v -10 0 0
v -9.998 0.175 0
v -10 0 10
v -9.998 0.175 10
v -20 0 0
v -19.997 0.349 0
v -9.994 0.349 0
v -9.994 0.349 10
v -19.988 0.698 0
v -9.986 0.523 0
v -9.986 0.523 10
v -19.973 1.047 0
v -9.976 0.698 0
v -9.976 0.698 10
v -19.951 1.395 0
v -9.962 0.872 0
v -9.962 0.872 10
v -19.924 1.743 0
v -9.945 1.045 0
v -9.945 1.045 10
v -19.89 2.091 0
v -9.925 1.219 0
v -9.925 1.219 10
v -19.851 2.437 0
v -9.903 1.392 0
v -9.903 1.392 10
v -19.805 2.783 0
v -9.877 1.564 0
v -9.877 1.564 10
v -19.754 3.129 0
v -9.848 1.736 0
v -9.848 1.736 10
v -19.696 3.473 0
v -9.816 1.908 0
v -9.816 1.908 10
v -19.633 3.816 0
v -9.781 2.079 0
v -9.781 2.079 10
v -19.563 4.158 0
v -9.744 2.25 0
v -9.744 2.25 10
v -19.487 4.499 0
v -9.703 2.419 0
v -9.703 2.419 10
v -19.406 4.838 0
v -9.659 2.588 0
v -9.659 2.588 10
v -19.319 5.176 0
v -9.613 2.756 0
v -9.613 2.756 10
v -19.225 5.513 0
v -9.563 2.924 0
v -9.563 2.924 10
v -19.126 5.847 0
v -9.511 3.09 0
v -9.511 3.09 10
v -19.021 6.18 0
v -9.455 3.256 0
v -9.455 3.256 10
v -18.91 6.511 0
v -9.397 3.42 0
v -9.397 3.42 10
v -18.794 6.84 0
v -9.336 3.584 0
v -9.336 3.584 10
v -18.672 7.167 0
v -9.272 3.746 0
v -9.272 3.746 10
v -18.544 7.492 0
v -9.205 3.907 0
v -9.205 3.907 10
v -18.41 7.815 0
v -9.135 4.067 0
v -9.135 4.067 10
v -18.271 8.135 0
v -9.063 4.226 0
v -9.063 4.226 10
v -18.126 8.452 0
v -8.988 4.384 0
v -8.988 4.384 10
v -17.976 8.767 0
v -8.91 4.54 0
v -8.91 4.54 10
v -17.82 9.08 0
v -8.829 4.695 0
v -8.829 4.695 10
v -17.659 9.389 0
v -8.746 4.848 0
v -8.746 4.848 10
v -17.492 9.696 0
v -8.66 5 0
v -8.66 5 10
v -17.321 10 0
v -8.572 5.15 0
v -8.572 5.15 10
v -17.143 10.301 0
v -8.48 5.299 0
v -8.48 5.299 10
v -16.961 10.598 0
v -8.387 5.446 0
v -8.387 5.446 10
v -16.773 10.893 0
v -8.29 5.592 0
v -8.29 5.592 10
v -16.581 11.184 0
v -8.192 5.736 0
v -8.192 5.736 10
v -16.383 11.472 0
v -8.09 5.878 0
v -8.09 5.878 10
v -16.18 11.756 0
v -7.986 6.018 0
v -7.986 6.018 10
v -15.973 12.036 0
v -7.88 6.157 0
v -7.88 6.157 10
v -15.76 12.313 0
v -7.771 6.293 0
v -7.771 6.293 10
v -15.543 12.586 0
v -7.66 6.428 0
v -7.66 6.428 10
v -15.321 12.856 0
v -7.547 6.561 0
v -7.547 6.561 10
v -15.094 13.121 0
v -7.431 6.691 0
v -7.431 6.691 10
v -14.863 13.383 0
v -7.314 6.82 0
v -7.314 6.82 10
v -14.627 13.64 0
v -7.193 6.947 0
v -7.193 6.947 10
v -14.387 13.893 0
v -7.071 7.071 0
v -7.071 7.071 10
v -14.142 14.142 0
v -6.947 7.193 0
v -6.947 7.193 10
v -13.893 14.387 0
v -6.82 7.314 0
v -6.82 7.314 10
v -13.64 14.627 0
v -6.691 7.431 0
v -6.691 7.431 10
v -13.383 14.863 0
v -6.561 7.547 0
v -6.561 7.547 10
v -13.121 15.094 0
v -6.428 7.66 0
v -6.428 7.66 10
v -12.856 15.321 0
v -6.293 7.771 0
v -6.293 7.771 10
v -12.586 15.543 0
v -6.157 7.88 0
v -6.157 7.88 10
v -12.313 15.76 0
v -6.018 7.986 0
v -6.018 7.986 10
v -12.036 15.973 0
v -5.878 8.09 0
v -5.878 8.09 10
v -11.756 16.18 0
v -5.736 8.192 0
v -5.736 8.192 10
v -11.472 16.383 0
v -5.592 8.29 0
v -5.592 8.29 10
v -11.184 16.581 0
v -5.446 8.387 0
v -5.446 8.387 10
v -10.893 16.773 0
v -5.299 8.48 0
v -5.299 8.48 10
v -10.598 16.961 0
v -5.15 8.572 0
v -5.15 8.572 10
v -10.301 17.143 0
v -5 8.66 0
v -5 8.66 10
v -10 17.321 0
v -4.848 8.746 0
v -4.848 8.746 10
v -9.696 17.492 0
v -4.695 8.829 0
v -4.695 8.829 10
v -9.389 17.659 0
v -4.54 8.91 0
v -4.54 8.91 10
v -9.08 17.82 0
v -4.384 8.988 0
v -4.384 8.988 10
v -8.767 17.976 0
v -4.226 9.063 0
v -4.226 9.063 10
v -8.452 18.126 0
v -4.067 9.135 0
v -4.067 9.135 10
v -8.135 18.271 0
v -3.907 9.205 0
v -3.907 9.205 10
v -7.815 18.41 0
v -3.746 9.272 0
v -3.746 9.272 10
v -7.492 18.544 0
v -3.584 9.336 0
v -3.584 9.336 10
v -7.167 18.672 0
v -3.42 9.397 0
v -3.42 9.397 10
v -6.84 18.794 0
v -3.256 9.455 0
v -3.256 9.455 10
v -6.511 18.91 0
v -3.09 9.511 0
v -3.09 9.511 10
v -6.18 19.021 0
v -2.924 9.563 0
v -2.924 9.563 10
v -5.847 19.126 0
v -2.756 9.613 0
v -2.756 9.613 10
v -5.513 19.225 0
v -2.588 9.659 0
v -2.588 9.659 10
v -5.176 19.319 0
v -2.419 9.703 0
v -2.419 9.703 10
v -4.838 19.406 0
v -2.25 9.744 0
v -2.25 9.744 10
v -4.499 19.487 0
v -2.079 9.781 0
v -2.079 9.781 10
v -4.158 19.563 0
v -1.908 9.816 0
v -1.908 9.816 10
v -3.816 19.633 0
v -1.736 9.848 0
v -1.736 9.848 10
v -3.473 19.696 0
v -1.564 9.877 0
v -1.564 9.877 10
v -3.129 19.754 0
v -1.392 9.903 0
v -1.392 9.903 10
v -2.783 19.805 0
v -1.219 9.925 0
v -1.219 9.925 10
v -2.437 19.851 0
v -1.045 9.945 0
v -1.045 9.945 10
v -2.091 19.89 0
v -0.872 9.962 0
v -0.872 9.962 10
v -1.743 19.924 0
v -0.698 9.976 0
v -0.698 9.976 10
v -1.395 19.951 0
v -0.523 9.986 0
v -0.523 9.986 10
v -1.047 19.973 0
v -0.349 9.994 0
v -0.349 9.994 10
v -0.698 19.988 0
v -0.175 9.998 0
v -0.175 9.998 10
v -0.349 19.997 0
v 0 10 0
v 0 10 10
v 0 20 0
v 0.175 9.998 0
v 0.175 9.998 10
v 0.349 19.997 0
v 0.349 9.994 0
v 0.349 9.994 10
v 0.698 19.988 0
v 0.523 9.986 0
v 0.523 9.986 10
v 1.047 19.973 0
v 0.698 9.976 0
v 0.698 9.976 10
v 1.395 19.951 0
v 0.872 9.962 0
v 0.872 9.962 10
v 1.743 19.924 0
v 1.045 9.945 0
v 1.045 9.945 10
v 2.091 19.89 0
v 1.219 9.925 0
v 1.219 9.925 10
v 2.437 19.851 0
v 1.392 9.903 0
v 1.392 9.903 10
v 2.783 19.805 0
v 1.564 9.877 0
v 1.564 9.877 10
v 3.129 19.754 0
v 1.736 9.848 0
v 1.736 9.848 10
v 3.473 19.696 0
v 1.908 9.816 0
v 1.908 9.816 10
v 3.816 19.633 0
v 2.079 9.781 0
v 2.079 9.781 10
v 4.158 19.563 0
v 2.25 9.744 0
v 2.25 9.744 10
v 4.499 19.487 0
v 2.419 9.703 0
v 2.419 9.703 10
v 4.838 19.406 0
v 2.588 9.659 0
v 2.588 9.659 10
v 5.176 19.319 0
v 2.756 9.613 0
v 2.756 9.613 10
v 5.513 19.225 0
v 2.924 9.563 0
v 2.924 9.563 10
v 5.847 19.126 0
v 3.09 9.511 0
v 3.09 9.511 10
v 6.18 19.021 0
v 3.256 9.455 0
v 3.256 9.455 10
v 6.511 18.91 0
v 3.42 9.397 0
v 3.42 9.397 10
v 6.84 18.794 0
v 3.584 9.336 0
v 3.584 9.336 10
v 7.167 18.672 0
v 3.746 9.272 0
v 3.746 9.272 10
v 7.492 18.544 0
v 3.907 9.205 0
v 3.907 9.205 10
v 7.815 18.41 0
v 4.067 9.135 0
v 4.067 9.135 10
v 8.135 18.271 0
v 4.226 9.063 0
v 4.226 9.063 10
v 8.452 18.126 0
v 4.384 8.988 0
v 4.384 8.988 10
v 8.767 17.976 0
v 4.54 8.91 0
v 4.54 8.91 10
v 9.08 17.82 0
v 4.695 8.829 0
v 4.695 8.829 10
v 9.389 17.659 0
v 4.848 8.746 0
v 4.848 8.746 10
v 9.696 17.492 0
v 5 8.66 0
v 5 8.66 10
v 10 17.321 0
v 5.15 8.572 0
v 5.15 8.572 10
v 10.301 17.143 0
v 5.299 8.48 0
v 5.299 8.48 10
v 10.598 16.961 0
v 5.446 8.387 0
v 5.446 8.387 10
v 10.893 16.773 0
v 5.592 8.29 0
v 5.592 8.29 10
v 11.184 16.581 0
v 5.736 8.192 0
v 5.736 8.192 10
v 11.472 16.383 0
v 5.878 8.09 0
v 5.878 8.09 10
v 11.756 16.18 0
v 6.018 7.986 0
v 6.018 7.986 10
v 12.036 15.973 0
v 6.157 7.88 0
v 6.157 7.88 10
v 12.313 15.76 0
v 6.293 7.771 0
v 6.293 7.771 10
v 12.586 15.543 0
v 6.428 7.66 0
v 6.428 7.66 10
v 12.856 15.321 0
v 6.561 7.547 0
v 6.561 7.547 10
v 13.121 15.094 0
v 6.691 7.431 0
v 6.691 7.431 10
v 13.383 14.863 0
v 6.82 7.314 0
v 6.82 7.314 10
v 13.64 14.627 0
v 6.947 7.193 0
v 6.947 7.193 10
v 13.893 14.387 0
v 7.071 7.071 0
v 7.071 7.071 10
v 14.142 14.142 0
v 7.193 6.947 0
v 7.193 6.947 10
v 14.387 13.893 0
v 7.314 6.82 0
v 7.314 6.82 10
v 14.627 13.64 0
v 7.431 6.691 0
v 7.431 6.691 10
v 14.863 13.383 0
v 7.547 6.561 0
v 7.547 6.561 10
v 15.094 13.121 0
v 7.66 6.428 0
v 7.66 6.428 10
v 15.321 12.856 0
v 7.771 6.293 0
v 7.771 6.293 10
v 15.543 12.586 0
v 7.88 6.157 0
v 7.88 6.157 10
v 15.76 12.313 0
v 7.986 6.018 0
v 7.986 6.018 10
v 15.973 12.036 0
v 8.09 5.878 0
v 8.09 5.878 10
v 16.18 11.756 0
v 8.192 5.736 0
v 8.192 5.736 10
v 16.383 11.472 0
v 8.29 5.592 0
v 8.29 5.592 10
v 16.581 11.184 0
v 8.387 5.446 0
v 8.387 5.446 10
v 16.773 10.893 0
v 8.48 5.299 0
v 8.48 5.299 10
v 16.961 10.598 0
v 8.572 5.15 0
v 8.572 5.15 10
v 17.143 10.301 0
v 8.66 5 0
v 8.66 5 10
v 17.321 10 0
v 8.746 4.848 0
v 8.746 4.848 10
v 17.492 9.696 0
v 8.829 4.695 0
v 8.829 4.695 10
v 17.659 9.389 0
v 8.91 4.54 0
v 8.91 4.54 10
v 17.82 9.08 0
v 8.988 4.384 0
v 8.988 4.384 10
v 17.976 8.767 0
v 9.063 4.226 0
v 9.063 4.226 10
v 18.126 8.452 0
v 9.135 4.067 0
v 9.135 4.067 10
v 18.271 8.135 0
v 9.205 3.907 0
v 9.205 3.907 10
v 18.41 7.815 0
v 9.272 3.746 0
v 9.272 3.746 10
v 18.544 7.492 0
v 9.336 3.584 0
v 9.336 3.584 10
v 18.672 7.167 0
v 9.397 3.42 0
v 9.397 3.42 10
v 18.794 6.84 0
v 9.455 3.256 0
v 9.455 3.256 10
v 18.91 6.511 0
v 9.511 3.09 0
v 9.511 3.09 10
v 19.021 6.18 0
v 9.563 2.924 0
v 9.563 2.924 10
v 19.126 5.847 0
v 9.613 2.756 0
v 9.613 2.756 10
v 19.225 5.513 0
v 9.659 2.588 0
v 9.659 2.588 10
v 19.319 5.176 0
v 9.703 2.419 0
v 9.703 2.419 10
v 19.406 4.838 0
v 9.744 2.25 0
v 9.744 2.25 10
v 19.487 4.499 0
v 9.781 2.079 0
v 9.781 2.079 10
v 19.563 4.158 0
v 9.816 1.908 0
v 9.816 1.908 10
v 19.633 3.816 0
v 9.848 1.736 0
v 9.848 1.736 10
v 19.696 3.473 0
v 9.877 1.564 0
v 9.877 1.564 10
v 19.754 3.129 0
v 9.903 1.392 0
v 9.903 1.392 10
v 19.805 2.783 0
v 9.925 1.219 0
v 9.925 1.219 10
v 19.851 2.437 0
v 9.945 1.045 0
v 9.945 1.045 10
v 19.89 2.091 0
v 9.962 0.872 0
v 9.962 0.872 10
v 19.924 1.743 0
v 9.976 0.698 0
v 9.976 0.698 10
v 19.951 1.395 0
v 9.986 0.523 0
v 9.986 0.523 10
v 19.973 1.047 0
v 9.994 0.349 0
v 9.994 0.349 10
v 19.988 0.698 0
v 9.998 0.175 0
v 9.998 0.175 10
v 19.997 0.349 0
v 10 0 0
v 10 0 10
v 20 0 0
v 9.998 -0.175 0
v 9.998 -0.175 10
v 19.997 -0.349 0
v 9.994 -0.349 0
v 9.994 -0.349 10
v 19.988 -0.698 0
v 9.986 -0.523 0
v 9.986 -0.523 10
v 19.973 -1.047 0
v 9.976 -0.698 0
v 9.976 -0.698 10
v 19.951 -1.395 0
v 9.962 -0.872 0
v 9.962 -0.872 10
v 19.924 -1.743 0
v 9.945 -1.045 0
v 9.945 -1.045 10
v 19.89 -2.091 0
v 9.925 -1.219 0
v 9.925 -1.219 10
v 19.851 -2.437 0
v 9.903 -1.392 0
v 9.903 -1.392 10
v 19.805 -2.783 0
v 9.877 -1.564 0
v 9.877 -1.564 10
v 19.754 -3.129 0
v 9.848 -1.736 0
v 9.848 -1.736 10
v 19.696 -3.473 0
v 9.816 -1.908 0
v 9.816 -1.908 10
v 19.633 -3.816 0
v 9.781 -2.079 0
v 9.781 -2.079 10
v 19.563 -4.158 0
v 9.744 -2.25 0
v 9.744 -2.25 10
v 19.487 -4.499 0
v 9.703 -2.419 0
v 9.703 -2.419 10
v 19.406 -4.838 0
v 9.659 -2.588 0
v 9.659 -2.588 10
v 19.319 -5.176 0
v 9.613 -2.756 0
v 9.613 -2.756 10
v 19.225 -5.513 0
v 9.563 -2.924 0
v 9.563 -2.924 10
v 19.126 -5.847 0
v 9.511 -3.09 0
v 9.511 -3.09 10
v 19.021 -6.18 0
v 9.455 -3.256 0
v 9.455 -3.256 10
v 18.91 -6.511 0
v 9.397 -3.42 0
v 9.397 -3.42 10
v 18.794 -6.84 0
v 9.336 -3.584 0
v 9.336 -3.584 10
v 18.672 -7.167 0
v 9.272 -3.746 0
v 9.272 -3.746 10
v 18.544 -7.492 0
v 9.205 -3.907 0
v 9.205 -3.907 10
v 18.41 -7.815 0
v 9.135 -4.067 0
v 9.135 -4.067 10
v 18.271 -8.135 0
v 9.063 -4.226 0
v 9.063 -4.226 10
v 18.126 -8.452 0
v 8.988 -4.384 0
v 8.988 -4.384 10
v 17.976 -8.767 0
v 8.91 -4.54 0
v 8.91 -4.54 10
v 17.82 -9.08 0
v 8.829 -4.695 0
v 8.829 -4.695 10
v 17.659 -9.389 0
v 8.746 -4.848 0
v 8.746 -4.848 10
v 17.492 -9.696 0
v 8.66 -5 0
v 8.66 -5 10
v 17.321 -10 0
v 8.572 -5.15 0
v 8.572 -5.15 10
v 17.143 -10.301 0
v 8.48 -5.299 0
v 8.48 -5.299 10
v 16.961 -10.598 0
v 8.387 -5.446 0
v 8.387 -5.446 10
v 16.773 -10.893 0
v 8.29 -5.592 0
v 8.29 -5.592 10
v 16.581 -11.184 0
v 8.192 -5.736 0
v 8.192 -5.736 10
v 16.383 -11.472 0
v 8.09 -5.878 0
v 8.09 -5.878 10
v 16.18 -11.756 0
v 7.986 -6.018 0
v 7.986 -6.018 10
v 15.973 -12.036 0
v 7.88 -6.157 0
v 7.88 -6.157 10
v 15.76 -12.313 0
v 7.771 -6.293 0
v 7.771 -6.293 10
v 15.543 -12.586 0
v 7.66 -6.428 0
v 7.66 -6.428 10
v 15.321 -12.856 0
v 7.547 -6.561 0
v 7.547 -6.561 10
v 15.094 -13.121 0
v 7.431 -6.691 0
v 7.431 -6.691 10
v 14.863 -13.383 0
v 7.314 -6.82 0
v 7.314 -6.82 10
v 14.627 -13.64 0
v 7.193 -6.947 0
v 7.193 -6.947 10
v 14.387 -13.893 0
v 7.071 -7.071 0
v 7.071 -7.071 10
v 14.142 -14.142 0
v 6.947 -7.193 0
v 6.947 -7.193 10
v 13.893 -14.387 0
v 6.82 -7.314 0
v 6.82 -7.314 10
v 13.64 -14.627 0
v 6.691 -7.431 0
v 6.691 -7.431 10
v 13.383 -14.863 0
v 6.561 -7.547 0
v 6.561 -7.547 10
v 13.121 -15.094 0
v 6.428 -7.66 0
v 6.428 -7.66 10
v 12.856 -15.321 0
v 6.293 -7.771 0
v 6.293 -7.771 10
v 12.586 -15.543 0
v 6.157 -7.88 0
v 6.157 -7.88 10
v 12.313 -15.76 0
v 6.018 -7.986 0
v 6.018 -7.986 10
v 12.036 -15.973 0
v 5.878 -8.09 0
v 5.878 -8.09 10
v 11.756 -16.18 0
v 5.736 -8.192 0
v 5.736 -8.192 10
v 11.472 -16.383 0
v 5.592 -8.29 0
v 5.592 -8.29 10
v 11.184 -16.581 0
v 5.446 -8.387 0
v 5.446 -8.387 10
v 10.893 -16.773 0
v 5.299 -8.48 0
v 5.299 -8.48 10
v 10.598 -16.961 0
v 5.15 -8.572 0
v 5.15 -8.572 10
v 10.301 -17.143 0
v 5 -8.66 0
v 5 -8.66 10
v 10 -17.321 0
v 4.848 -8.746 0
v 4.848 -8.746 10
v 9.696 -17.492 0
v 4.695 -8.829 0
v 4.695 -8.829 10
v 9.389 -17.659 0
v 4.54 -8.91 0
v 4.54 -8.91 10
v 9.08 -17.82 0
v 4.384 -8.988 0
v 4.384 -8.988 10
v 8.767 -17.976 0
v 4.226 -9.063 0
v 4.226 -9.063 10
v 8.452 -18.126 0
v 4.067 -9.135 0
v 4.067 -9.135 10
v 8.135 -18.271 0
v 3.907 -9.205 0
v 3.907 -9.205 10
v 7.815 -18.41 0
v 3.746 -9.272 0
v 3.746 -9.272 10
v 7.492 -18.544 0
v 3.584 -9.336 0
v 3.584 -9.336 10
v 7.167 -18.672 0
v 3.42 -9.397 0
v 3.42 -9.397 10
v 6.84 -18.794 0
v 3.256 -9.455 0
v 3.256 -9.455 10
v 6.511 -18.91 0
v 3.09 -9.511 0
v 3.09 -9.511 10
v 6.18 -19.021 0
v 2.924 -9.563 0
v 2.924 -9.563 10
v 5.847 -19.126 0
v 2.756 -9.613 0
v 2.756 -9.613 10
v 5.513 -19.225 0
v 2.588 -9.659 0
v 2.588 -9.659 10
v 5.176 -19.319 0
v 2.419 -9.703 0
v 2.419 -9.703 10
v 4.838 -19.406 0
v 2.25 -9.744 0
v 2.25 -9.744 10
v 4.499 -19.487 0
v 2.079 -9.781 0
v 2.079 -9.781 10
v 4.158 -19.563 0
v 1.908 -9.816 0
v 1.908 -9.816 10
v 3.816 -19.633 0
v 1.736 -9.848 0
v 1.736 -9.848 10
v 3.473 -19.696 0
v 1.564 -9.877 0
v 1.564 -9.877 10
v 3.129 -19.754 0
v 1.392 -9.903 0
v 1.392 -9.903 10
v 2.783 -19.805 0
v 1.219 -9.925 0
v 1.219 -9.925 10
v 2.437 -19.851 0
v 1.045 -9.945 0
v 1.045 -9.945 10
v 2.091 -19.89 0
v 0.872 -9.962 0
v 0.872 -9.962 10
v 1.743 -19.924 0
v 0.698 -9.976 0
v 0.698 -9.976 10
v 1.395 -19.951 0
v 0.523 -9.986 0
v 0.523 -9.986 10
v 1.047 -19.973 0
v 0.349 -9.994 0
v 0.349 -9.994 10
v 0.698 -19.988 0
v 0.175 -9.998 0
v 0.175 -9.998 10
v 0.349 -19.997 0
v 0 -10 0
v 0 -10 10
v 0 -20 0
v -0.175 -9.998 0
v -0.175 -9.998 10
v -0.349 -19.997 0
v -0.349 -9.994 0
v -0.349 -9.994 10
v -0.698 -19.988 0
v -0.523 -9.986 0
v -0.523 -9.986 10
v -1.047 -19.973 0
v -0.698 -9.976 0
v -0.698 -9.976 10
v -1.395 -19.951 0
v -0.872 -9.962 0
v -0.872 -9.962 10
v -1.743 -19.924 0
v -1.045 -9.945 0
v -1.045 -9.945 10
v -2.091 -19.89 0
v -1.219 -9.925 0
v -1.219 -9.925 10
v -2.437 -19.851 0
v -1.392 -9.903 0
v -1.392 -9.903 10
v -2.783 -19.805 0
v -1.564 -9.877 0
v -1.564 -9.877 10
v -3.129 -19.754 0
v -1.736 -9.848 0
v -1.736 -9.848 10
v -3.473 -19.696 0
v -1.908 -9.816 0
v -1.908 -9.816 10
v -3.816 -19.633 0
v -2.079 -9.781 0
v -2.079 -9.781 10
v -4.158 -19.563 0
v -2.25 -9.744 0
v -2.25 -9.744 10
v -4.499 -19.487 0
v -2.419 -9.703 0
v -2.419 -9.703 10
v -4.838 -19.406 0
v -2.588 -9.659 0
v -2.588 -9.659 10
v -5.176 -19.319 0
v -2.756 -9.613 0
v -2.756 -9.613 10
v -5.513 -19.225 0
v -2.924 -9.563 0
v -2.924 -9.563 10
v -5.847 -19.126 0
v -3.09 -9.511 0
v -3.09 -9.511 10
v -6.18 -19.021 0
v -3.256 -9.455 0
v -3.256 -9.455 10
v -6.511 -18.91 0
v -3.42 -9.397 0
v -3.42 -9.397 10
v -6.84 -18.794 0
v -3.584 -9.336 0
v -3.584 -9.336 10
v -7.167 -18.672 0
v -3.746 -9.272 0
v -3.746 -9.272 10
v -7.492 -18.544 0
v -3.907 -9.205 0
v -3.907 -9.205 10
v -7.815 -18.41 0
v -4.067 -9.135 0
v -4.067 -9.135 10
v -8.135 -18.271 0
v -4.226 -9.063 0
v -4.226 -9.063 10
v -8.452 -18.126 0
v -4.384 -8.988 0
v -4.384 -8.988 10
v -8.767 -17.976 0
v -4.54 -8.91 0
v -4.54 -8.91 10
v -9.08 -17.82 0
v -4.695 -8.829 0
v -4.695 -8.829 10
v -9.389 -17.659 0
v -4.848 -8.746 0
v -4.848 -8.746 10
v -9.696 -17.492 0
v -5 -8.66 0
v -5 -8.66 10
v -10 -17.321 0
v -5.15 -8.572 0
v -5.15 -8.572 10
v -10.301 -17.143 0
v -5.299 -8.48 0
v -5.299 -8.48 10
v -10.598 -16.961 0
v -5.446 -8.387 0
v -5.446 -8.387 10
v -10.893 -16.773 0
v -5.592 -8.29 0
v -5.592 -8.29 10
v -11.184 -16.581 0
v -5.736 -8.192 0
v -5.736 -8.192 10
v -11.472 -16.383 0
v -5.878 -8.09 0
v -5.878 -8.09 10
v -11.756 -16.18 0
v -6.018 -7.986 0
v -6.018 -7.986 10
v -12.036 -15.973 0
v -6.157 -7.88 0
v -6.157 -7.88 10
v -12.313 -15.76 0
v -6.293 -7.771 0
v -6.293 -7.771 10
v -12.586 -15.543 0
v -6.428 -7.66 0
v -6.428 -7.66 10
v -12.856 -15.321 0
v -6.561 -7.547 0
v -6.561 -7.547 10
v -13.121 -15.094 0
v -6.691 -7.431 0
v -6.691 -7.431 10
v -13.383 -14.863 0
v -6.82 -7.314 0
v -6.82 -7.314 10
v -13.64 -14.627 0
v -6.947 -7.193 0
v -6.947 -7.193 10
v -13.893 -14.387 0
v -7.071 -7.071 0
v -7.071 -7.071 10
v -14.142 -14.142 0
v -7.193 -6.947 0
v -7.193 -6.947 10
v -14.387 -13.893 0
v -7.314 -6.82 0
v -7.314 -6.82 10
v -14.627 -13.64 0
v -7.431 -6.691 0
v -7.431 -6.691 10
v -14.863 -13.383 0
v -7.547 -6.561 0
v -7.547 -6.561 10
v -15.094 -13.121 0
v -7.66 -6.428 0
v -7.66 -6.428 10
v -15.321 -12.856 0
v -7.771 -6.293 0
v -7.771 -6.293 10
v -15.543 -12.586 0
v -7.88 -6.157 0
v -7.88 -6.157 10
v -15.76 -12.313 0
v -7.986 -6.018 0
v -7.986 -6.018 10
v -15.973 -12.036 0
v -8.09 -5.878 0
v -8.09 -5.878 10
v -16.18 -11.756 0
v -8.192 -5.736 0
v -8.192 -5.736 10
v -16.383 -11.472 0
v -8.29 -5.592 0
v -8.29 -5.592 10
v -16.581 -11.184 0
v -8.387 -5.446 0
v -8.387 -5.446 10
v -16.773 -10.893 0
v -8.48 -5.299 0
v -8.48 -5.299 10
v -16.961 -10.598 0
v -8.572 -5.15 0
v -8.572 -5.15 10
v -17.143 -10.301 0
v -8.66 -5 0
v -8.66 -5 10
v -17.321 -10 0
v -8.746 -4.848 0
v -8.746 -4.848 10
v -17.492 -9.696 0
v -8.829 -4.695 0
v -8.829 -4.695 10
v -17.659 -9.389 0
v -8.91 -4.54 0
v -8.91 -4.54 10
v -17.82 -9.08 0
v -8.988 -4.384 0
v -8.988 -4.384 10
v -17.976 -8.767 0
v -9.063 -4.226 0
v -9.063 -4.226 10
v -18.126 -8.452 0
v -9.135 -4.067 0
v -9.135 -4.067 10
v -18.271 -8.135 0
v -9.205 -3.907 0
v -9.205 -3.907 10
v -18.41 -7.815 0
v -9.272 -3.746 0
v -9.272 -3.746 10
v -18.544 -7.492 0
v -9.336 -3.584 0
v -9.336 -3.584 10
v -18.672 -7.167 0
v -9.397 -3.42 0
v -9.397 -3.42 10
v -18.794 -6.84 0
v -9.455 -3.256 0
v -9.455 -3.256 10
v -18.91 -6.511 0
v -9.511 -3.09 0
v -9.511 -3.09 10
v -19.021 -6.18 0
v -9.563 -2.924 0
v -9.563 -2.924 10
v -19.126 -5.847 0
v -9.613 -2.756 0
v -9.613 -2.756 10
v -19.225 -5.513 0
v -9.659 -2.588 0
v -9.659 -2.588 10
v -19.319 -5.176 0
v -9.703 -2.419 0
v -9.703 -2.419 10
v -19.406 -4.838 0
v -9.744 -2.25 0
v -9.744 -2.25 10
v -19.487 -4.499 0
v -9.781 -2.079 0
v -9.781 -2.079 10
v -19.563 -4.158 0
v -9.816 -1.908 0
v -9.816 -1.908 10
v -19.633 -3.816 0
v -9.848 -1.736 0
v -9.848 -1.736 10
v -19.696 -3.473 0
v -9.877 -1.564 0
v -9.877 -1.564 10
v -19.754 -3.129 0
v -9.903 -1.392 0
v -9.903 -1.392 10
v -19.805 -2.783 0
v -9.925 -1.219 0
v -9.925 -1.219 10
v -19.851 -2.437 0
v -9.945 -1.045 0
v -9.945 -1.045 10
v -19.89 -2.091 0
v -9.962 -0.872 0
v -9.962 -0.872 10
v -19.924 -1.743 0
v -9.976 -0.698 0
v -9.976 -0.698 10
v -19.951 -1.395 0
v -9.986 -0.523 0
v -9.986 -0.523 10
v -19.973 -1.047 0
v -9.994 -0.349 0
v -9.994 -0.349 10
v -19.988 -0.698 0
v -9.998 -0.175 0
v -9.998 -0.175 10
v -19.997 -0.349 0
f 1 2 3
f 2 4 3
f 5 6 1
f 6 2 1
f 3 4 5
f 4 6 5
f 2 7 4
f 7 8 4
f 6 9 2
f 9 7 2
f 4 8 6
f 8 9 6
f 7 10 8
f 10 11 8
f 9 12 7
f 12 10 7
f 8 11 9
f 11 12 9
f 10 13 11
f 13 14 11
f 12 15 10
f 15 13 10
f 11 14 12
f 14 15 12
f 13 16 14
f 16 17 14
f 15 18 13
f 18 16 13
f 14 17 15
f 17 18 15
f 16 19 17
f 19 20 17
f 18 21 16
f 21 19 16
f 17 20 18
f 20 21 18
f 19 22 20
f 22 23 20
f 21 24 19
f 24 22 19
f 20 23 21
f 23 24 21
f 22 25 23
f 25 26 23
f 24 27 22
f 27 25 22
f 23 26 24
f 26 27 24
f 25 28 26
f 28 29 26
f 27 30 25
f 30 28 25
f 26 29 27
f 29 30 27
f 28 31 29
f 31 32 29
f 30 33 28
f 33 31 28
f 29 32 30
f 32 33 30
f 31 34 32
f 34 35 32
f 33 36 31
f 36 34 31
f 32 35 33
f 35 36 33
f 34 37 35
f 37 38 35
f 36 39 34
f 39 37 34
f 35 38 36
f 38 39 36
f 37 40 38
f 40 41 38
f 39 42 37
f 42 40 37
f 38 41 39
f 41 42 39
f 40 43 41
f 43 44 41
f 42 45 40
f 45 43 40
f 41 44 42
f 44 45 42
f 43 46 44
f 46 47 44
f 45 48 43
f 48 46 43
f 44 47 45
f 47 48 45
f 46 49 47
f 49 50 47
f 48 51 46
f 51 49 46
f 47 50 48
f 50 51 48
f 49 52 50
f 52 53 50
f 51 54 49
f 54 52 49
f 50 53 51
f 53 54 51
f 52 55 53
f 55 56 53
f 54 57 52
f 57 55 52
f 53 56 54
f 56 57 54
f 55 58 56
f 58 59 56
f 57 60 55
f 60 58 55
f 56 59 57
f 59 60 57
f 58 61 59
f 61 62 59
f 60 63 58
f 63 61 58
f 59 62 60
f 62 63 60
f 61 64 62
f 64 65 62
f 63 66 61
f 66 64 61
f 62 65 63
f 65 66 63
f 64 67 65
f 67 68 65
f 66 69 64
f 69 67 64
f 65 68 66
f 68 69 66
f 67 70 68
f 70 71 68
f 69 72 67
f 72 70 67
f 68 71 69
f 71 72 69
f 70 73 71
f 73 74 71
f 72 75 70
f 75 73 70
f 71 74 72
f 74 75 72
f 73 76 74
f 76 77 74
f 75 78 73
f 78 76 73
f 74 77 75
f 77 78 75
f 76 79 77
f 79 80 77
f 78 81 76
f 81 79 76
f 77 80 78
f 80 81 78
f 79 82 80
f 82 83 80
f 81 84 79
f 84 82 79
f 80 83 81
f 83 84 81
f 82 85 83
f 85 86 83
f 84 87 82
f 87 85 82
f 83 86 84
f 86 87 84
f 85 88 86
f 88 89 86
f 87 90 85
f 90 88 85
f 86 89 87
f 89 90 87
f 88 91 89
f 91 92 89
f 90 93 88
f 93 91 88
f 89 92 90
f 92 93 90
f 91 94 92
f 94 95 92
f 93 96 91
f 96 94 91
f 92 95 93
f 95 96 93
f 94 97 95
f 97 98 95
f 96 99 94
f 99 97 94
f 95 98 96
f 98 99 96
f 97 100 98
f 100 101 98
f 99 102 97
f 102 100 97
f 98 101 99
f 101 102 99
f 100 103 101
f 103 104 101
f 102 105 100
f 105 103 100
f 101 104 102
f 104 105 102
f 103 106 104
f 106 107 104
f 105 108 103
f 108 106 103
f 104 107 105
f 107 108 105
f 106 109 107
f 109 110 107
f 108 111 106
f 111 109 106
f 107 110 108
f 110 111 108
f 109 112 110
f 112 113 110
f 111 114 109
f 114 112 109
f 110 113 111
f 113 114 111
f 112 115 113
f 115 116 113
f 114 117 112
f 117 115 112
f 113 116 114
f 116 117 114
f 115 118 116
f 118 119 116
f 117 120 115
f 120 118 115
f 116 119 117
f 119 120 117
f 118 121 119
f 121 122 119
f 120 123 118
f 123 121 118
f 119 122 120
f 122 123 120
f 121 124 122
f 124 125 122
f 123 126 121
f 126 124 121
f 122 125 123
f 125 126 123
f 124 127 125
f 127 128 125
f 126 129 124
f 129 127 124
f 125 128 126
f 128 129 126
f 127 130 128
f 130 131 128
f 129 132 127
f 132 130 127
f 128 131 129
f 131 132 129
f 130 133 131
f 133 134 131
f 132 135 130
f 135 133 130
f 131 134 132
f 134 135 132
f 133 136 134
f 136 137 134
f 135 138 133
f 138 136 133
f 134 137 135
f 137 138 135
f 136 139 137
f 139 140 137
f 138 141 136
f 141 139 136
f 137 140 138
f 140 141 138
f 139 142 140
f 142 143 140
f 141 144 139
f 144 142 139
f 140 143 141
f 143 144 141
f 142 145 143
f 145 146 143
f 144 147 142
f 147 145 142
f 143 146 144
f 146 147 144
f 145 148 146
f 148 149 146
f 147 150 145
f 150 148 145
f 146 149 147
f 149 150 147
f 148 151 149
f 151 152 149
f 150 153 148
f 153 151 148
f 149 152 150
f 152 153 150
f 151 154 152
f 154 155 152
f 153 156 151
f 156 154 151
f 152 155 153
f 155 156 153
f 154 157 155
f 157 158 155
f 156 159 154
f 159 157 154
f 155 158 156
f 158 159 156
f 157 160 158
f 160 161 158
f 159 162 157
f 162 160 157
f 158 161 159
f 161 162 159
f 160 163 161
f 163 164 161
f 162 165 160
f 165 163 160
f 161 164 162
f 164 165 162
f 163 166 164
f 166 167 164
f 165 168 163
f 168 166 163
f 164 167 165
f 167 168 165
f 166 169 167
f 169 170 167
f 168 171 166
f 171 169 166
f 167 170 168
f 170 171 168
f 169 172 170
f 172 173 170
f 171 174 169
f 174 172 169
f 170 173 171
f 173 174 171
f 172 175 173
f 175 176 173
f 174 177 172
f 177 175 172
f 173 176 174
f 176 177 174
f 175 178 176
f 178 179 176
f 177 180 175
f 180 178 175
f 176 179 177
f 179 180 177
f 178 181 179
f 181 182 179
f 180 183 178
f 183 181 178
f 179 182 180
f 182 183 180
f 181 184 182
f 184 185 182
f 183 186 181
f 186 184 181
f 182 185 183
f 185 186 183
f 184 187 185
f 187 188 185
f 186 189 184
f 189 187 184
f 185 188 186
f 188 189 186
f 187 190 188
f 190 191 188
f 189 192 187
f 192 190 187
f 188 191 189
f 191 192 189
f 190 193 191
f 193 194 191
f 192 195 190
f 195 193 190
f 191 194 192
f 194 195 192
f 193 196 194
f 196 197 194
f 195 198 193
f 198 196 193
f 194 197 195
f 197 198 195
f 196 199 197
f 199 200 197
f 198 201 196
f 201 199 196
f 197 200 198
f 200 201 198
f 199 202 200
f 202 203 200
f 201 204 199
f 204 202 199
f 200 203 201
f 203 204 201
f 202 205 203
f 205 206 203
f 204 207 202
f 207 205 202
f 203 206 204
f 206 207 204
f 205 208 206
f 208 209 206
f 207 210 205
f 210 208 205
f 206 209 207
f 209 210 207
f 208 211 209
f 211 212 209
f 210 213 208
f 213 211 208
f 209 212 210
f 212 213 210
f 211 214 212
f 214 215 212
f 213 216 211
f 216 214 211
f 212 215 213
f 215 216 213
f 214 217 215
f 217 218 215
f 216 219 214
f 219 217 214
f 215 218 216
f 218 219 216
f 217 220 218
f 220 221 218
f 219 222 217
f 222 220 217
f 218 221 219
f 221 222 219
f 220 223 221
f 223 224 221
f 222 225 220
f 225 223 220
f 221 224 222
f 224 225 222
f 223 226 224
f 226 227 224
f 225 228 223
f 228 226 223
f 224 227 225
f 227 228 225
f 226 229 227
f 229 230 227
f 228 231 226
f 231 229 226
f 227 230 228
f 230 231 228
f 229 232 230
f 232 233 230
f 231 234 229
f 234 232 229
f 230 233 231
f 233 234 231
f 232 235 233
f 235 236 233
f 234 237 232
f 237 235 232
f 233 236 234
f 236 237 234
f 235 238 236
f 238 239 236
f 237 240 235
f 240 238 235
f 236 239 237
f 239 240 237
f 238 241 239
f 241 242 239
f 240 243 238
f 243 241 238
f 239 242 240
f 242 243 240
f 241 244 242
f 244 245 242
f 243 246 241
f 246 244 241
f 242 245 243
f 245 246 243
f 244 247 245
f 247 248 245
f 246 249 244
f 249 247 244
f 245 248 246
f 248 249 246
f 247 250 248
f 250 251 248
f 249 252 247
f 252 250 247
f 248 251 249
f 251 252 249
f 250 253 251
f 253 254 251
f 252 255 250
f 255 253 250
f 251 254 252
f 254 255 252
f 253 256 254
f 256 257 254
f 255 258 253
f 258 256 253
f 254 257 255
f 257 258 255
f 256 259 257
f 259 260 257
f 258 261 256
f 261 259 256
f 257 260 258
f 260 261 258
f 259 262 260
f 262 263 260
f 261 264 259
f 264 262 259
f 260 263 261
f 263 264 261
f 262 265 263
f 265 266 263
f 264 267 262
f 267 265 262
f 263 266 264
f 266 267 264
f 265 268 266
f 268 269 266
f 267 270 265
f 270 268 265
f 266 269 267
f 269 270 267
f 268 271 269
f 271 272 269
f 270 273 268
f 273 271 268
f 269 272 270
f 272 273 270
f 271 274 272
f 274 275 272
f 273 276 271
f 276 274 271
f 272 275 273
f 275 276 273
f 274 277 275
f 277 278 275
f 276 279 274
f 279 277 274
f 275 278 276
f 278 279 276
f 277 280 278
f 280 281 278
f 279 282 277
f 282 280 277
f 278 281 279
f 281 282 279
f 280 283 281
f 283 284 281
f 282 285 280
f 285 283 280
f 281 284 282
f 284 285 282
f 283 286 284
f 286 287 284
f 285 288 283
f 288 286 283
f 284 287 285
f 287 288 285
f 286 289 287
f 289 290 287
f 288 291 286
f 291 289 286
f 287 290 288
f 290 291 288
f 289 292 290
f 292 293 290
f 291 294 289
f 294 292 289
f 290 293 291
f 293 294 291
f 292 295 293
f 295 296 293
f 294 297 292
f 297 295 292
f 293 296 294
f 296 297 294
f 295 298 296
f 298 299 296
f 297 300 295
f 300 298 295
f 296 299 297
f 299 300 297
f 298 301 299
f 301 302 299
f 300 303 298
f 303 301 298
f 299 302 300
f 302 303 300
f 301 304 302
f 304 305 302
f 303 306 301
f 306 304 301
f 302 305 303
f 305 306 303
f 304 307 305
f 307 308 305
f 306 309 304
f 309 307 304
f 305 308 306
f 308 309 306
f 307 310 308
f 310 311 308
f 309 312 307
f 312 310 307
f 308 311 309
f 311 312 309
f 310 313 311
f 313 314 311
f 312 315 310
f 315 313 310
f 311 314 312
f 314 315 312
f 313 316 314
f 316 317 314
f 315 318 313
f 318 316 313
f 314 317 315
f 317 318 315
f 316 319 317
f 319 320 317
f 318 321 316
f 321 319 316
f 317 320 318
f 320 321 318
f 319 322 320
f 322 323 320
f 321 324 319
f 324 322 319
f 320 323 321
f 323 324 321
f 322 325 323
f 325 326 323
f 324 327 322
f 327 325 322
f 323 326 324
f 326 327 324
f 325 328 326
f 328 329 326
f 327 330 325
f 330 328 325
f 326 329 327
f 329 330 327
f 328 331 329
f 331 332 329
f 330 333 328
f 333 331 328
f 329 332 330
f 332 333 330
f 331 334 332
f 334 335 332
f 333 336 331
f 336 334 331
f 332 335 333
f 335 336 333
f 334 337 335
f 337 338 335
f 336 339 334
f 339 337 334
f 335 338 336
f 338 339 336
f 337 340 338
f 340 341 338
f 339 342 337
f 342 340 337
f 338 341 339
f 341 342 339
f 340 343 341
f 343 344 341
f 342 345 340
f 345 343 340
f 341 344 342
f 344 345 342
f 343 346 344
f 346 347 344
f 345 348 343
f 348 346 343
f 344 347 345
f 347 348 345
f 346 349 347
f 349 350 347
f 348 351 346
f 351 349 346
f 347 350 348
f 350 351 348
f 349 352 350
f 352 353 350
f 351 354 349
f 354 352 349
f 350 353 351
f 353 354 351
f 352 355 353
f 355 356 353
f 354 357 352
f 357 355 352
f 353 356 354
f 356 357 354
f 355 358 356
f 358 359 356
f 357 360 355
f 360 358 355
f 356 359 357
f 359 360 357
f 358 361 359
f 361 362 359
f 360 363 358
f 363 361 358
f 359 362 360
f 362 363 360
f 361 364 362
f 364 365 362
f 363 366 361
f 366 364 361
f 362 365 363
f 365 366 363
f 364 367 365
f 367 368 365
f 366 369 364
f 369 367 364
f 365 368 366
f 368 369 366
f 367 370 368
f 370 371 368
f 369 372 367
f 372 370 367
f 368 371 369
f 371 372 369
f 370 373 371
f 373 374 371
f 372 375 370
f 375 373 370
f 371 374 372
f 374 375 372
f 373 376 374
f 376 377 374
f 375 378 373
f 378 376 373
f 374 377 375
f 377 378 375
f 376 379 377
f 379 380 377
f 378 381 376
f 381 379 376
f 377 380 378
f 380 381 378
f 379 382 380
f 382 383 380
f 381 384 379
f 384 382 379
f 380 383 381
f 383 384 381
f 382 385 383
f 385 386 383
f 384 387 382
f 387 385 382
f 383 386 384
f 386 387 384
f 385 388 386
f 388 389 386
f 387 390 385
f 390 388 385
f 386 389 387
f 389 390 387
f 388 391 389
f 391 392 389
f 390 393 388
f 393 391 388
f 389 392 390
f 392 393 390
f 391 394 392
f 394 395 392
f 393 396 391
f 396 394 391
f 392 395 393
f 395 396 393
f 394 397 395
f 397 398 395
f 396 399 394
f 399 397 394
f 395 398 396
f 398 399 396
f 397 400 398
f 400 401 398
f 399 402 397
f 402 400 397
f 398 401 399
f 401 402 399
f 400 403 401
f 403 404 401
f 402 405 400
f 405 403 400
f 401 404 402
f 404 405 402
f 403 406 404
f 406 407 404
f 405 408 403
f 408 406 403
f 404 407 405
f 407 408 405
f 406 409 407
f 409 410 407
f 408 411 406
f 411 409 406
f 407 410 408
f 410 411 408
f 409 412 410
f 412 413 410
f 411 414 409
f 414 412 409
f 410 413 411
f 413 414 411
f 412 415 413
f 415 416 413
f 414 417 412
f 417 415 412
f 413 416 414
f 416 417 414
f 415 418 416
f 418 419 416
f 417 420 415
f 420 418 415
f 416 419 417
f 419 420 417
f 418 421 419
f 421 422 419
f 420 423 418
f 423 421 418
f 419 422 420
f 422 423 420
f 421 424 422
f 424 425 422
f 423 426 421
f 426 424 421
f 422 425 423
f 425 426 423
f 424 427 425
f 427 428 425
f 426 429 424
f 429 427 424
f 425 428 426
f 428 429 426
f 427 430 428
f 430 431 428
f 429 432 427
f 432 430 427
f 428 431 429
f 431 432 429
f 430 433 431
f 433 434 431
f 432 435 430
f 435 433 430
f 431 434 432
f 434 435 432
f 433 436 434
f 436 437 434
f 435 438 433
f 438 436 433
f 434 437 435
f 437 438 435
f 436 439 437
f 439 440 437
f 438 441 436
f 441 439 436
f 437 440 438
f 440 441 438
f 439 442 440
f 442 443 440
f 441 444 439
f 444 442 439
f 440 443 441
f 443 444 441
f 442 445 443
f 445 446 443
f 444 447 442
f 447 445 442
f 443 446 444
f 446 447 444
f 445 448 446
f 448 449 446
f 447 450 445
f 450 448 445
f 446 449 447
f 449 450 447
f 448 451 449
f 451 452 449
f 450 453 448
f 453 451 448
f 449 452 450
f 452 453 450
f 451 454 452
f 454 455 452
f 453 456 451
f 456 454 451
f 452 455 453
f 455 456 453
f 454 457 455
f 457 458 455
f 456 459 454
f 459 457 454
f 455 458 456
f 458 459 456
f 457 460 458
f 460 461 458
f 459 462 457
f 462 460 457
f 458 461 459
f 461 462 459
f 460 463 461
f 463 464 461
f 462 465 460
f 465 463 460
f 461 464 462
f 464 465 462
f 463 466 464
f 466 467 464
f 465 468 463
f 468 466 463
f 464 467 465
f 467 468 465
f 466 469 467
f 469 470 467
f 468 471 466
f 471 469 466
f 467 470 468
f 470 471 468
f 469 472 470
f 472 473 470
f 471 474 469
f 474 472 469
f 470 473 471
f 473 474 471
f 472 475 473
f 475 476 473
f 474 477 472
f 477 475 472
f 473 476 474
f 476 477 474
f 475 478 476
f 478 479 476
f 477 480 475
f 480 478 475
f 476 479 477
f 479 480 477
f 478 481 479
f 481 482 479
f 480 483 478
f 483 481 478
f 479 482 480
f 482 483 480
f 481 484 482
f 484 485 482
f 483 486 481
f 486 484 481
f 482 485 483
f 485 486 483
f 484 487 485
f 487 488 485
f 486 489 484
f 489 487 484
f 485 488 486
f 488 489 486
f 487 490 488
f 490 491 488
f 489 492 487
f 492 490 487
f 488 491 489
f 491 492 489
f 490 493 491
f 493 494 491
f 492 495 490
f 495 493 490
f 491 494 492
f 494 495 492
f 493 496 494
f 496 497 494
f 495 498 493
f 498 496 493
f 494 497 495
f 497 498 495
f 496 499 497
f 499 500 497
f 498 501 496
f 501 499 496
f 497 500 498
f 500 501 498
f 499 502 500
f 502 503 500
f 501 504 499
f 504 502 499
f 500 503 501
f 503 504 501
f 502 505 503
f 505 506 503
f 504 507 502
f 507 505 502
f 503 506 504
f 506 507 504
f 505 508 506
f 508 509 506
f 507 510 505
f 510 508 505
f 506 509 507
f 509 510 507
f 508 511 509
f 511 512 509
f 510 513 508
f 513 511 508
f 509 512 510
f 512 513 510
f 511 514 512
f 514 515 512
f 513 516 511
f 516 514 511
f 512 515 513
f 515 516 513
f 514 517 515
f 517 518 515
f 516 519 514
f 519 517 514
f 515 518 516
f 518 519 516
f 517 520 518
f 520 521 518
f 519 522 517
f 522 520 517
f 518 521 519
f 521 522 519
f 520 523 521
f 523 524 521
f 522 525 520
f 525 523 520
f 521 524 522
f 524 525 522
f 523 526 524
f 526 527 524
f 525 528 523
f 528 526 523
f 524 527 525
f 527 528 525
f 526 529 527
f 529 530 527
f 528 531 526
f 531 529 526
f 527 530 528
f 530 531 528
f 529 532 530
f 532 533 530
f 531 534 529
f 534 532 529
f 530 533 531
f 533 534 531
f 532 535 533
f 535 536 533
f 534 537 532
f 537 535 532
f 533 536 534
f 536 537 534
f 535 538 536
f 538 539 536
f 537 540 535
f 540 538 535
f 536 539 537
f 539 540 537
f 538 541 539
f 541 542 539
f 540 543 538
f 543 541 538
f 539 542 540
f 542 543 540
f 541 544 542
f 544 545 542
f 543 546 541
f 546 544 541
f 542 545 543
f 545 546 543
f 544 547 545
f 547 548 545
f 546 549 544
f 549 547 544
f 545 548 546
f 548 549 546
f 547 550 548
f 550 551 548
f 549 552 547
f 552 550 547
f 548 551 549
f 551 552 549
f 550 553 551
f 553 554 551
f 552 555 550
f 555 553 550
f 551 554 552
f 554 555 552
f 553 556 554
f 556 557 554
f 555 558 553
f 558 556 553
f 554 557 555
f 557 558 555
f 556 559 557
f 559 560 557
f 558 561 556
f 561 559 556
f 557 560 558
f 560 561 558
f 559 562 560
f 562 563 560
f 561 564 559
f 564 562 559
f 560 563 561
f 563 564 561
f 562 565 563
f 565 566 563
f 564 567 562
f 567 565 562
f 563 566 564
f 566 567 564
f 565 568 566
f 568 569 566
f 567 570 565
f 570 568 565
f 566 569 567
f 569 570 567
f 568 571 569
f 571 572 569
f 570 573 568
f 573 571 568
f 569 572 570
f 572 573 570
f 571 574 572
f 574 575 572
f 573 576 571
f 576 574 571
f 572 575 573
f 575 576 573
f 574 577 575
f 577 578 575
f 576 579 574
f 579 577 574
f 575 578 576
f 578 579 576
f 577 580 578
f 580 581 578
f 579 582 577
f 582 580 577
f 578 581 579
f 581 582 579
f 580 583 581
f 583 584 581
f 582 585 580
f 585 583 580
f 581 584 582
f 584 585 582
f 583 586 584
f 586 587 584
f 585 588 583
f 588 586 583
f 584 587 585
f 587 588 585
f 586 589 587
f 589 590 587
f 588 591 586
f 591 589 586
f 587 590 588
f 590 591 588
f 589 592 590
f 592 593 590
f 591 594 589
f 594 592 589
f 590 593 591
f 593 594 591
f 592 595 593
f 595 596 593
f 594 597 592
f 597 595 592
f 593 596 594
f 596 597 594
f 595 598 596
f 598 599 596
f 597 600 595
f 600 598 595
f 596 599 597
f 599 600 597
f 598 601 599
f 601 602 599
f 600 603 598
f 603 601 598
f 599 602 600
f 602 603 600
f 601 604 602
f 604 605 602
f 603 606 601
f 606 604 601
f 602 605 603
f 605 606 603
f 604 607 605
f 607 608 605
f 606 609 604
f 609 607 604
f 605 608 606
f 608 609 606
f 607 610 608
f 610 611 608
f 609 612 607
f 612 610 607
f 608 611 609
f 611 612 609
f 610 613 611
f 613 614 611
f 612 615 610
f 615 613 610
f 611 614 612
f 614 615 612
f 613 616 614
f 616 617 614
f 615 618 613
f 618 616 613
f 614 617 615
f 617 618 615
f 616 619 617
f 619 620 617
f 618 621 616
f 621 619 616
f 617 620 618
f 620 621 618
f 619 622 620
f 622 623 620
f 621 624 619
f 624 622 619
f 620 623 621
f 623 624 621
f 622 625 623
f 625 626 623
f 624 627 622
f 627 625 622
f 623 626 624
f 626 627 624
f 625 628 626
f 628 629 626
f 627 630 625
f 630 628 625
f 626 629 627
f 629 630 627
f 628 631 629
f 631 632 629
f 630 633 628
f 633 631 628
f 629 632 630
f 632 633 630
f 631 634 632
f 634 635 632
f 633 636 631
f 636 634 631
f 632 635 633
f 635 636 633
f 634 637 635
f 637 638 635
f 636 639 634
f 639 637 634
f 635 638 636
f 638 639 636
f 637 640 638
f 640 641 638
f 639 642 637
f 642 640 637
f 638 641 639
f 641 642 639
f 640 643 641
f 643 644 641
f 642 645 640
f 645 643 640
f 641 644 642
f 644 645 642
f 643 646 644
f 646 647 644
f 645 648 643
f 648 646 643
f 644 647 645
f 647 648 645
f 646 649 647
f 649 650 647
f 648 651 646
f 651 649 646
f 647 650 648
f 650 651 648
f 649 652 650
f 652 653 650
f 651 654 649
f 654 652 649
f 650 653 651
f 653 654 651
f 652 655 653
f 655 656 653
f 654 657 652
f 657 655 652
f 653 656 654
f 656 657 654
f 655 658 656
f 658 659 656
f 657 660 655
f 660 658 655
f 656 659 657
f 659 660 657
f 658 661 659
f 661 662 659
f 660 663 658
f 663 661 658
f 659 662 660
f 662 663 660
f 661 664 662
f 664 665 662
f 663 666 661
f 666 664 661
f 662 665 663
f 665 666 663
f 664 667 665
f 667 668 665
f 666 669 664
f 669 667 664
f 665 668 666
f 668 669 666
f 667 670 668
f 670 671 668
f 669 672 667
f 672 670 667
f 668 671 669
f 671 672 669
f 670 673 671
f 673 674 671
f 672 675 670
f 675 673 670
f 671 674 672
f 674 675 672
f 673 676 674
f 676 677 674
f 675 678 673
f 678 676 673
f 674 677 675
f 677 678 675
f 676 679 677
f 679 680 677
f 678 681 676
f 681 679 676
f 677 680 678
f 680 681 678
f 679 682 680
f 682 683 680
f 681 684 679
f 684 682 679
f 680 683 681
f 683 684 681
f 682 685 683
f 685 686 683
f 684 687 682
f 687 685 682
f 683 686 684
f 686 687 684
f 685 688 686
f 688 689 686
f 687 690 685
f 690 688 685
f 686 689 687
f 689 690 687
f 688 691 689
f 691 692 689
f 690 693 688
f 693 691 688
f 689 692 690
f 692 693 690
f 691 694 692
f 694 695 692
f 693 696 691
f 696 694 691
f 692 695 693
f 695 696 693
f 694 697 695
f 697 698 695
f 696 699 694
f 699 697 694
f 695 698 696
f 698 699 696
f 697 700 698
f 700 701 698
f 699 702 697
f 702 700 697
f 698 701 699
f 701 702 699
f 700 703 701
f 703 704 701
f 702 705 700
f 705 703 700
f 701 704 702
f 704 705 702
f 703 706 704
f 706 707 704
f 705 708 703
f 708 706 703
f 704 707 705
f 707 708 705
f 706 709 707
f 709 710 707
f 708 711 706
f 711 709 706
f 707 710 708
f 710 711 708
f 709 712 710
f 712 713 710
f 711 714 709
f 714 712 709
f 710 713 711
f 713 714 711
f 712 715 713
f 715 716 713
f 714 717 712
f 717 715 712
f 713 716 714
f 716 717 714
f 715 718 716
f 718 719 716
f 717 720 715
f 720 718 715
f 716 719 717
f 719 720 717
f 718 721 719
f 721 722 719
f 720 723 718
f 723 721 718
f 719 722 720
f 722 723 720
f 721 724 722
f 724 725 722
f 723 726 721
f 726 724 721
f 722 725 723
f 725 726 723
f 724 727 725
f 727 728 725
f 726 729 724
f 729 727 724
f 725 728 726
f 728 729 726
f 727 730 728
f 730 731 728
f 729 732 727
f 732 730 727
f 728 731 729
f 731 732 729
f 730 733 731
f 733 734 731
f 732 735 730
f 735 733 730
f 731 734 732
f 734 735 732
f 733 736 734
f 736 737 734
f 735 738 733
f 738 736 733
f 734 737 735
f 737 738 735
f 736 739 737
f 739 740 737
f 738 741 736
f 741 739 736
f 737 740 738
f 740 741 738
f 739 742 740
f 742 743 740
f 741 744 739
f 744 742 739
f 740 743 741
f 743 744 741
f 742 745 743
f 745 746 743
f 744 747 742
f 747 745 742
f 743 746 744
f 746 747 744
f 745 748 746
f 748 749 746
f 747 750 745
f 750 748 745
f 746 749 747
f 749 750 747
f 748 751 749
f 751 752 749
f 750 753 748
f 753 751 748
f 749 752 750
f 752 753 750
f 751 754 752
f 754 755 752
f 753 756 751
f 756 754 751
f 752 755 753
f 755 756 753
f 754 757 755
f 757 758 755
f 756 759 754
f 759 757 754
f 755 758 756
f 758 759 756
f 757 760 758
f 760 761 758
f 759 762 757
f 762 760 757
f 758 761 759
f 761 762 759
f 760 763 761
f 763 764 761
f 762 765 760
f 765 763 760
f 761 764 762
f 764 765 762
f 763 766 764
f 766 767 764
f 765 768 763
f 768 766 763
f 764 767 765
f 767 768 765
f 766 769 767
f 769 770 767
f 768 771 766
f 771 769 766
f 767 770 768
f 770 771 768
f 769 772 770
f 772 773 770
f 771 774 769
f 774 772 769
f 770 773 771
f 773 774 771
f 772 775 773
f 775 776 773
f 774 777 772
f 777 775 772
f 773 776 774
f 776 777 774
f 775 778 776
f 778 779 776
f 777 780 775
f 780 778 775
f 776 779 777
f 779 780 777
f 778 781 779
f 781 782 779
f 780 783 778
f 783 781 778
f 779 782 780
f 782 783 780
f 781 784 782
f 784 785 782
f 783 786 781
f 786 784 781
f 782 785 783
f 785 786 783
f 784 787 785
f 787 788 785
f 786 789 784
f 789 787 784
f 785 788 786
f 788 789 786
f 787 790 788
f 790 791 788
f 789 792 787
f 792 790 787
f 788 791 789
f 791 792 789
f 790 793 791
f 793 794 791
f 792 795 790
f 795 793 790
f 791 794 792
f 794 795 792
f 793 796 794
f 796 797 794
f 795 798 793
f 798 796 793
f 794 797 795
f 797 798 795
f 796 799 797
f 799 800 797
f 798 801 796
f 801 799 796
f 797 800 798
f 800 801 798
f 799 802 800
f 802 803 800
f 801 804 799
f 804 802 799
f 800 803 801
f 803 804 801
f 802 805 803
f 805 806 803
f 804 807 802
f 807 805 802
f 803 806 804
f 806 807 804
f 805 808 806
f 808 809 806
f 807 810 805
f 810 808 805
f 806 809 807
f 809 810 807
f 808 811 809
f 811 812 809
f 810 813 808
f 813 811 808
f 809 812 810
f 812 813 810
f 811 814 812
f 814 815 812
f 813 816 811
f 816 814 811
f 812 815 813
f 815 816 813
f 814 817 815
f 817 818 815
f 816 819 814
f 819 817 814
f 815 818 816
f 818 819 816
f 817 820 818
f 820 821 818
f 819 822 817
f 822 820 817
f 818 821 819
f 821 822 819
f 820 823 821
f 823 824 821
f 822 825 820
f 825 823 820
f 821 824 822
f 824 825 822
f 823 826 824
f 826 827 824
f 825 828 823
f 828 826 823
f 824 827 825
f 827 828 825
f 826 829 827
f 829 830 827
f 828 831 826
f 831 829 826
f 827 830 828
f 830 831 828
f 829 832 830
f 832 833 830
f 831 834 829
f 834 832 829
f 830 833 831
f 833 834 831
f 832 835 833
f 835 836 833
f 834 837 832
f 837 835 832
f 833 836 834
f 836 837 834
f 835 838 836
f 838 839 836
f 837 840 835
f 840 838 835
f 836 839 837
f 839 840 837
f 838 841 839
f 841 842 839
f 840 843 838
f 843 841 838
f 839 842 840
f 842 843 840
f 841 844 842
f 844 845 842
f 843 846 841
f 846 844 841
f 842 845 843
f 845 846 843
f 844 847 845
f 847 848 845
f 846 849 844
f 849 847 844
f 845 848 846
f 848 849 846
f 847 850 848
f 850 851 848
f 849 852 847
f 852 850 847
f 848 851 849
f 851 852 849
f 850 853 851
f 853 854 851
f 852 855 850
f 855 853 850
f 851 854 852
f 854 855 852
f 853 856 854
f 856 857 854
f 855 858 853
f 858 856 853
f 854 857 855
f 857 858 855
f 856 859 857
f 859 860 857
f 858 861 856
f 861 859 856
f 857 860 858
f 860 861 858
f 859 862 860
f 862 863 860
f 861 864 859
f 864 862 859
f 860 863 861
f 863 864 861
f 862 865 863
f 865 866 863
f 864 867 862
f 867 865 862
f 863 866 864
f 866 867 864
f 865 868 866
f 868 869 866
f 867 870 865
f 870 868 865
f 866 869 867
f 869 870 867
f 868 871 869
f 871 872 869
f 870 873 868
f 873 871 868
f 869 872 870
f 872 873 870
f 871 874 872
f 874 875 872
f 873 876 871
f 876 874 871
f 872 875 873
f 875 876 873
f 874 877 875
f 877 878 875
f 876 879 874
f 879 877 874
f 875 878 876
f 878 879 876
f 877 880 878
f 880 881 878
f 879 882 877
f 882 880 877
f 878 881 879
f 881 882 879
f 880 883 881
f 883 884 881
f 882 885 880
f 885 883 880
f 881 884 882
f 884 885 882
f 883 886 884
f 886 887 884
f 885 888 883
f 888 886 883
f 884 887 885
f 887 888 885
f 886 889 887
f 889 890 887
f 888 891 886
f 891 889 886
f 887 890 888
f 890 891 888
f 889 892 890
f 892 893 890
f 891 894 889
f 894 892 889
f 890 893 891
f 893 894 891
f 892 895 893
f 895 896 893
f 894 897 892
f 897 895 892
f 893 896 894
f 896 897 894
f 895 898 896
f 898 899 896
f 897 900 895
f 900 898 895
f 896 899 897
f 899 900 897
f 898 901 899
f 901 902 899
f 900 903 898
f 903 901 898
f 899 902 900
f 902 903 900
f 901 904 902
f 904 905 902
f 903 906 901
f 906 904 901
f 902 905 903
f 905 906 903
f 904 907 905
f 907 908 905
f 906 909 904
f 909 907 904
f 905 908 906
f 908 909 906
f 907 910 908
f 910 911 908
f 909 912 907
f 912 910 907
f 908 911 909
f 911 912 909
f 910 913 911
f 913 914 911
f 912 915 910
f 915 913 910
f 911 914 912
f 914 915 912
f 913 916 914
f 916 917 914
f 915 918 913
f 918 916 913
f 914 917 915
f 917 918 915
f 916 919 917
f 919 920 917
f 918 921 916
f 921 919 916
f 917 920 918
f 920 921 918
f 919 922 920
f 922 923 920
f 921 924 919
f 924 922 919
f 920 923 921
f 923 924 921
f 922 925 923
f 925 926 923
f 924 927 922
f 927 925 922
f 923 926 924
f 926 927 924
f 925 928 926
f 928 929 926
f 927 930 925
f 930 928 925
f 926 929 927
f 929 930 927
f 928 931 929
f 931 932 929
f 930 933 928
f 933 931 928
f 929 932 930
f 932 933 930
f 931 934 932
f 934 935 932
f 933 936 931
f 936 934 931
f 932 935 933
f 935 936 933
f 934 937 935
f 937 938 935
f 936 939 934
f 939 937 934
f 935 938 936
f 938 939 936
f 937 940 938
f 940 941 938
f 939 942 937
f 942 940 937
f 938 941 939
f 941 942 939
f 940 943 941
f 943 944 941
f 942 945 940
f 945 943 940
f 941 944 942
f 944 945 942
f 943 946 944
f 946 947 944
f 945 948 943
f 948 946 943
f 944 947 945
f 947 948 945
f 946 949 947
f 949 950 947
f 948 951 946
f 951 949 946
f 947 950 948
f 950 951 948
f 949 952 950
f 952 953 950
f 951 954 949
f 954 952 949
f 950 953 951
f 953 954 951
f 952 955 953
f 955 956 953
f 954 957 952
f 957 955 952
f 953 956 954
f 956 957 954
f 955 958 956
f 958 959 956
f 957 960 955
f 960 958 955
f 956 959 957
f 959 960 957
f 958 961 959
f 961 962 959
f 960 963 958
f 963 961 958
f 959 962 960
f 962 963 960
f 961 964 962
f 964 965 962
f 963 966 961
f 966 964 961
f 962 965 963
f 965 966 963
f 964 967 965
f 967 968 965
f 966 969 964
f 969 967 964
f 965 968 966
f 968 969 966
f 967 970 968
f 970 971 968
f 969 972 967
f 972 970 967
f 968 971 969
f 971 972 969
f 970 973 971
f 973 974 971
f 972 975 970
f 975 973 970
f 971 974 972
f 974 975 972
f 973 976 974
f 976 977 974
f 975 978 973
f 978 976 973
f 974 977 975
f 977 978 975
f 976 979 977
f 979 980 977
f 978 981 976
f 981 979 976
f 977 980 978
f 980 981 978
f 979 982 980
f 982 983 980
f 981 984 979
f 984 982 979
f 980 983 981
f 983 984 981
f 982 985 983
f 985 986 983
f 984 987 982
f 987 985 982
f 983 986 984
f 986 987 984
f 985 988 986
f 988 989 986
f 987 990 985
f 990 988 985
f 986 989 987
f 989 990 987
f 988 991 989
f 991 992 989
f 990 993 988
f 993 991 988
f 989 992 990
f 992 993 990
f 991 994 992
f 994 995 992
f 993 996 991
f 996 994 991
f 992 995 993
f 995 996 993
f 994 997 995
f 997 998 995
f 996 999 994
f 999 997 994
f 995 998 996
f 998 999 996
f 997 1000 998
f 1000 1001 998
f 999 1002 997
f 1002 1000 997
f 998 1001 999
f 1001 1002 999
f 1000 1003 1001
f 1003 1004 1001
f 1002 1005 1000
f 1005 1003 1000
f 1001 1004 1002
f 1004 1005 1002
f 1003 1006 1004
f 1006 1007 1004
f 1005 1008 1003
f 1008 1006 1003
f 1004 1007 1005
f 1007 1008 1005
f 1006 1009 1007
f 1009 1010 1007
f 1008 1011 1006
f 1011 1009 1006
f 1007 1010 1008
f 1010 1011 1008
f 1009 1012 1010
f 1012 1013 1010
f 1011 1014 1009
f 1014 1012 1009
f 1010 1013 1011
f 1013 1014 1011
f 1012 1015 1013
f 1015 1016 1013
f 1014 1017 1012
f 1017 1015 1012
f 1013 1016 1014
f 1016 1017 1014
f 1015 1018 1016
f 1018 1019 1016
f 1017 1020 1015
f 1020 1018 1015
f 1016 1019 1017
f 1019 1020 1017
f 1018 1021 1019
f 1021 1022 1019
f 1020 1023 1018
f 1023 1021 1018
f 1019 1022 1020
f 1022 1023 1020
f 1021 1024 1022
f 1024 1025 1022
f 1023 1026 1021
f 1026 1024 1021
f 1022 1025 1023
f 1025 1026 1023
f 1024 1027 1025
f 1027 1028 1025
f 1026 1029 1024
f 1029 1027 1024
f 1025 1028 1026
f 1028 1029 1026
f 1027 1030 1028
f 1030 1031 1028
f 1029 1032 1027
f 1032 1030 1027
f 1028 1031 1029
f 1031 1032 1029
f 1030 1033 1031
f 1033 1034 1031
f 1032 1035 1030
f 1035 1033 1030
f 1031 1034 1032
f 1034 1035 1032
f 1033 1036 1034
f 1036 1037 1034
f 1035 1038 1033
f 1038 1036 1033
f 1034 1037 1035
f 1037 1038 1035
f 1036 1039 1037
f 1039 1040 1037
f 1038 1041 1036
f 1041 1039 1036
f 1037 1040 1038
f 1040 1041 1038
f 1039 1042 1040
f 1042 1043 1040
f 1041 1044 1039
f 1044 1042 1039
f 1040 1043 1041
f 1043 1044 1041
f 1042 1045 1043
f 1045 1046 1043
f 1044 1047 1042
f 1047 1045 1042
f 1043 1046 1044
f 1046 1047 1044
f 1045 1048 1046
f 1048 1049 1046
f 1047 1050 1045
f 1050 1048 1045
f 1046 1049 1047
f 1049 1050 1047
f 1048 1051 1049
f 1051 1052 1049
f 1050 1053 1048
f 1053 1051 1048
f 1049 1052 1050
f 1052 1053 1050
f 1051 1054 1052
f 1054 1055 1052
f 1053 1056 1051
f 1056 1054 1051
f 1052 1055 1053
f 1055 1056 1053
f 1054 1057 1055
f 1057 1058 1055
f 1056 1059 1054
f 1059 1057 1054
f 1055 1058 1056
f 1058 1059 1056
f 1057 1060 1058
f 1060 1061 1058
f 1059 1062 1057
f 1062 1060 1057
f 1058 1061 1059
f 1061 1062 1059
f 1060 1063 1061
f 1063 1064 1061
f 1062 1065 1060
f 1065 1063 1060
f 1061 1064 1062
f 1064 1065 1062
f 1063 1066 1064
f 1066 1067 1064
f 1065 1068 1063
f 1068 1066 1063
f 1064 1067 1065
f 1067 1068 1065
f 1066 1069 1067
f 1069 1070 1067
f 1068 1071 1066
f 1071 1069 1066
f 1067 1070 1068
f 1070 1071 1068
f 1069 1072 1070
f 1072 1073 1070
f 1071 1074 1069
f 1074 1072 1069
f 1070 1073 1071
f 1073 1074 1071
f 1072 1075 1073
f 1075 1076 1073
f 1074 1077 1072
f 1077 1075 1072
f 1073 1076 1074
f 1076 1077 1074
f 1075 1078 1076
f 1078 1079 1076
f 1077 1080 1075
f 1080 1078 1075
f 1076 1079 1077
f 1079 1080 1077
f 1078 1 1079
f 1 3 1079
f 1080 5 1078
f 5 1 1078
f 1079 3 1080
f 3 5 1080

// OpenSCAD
/* Rotiertes Dreieck.
   Vorlesungsbeispiel für die Integration in 
   Polar- bzw. Zylinderkoordinaten.
   
   Abmessungen wie in meiner Mathematik Vorlesung, jedoch um den Faktor 10 aufgebläht.
   Außerdem ist hier die große Auflagefläche unten, damit es sich gut drucken lässt.
*/

// schön rund
$fn=360;

faktor = 10; // Damit es begreibar wird
ri=1; // Radius des Lochs
ra=2; // Äußerer Radius
zu=0; // Z unten
zoi=1; // Z oben innen
zoa=0; // Z oben außen

// Erzeuge ein Dreieck mit folgenden Punkten
punkte = [ [ri,zu], [ra,zu], [ri,zoi] ];

// Rotiere das Dreieck, skaliere
scale([faktor,faktor,faktor]) rotate_extrude(angle=360) polygon(punkte);
